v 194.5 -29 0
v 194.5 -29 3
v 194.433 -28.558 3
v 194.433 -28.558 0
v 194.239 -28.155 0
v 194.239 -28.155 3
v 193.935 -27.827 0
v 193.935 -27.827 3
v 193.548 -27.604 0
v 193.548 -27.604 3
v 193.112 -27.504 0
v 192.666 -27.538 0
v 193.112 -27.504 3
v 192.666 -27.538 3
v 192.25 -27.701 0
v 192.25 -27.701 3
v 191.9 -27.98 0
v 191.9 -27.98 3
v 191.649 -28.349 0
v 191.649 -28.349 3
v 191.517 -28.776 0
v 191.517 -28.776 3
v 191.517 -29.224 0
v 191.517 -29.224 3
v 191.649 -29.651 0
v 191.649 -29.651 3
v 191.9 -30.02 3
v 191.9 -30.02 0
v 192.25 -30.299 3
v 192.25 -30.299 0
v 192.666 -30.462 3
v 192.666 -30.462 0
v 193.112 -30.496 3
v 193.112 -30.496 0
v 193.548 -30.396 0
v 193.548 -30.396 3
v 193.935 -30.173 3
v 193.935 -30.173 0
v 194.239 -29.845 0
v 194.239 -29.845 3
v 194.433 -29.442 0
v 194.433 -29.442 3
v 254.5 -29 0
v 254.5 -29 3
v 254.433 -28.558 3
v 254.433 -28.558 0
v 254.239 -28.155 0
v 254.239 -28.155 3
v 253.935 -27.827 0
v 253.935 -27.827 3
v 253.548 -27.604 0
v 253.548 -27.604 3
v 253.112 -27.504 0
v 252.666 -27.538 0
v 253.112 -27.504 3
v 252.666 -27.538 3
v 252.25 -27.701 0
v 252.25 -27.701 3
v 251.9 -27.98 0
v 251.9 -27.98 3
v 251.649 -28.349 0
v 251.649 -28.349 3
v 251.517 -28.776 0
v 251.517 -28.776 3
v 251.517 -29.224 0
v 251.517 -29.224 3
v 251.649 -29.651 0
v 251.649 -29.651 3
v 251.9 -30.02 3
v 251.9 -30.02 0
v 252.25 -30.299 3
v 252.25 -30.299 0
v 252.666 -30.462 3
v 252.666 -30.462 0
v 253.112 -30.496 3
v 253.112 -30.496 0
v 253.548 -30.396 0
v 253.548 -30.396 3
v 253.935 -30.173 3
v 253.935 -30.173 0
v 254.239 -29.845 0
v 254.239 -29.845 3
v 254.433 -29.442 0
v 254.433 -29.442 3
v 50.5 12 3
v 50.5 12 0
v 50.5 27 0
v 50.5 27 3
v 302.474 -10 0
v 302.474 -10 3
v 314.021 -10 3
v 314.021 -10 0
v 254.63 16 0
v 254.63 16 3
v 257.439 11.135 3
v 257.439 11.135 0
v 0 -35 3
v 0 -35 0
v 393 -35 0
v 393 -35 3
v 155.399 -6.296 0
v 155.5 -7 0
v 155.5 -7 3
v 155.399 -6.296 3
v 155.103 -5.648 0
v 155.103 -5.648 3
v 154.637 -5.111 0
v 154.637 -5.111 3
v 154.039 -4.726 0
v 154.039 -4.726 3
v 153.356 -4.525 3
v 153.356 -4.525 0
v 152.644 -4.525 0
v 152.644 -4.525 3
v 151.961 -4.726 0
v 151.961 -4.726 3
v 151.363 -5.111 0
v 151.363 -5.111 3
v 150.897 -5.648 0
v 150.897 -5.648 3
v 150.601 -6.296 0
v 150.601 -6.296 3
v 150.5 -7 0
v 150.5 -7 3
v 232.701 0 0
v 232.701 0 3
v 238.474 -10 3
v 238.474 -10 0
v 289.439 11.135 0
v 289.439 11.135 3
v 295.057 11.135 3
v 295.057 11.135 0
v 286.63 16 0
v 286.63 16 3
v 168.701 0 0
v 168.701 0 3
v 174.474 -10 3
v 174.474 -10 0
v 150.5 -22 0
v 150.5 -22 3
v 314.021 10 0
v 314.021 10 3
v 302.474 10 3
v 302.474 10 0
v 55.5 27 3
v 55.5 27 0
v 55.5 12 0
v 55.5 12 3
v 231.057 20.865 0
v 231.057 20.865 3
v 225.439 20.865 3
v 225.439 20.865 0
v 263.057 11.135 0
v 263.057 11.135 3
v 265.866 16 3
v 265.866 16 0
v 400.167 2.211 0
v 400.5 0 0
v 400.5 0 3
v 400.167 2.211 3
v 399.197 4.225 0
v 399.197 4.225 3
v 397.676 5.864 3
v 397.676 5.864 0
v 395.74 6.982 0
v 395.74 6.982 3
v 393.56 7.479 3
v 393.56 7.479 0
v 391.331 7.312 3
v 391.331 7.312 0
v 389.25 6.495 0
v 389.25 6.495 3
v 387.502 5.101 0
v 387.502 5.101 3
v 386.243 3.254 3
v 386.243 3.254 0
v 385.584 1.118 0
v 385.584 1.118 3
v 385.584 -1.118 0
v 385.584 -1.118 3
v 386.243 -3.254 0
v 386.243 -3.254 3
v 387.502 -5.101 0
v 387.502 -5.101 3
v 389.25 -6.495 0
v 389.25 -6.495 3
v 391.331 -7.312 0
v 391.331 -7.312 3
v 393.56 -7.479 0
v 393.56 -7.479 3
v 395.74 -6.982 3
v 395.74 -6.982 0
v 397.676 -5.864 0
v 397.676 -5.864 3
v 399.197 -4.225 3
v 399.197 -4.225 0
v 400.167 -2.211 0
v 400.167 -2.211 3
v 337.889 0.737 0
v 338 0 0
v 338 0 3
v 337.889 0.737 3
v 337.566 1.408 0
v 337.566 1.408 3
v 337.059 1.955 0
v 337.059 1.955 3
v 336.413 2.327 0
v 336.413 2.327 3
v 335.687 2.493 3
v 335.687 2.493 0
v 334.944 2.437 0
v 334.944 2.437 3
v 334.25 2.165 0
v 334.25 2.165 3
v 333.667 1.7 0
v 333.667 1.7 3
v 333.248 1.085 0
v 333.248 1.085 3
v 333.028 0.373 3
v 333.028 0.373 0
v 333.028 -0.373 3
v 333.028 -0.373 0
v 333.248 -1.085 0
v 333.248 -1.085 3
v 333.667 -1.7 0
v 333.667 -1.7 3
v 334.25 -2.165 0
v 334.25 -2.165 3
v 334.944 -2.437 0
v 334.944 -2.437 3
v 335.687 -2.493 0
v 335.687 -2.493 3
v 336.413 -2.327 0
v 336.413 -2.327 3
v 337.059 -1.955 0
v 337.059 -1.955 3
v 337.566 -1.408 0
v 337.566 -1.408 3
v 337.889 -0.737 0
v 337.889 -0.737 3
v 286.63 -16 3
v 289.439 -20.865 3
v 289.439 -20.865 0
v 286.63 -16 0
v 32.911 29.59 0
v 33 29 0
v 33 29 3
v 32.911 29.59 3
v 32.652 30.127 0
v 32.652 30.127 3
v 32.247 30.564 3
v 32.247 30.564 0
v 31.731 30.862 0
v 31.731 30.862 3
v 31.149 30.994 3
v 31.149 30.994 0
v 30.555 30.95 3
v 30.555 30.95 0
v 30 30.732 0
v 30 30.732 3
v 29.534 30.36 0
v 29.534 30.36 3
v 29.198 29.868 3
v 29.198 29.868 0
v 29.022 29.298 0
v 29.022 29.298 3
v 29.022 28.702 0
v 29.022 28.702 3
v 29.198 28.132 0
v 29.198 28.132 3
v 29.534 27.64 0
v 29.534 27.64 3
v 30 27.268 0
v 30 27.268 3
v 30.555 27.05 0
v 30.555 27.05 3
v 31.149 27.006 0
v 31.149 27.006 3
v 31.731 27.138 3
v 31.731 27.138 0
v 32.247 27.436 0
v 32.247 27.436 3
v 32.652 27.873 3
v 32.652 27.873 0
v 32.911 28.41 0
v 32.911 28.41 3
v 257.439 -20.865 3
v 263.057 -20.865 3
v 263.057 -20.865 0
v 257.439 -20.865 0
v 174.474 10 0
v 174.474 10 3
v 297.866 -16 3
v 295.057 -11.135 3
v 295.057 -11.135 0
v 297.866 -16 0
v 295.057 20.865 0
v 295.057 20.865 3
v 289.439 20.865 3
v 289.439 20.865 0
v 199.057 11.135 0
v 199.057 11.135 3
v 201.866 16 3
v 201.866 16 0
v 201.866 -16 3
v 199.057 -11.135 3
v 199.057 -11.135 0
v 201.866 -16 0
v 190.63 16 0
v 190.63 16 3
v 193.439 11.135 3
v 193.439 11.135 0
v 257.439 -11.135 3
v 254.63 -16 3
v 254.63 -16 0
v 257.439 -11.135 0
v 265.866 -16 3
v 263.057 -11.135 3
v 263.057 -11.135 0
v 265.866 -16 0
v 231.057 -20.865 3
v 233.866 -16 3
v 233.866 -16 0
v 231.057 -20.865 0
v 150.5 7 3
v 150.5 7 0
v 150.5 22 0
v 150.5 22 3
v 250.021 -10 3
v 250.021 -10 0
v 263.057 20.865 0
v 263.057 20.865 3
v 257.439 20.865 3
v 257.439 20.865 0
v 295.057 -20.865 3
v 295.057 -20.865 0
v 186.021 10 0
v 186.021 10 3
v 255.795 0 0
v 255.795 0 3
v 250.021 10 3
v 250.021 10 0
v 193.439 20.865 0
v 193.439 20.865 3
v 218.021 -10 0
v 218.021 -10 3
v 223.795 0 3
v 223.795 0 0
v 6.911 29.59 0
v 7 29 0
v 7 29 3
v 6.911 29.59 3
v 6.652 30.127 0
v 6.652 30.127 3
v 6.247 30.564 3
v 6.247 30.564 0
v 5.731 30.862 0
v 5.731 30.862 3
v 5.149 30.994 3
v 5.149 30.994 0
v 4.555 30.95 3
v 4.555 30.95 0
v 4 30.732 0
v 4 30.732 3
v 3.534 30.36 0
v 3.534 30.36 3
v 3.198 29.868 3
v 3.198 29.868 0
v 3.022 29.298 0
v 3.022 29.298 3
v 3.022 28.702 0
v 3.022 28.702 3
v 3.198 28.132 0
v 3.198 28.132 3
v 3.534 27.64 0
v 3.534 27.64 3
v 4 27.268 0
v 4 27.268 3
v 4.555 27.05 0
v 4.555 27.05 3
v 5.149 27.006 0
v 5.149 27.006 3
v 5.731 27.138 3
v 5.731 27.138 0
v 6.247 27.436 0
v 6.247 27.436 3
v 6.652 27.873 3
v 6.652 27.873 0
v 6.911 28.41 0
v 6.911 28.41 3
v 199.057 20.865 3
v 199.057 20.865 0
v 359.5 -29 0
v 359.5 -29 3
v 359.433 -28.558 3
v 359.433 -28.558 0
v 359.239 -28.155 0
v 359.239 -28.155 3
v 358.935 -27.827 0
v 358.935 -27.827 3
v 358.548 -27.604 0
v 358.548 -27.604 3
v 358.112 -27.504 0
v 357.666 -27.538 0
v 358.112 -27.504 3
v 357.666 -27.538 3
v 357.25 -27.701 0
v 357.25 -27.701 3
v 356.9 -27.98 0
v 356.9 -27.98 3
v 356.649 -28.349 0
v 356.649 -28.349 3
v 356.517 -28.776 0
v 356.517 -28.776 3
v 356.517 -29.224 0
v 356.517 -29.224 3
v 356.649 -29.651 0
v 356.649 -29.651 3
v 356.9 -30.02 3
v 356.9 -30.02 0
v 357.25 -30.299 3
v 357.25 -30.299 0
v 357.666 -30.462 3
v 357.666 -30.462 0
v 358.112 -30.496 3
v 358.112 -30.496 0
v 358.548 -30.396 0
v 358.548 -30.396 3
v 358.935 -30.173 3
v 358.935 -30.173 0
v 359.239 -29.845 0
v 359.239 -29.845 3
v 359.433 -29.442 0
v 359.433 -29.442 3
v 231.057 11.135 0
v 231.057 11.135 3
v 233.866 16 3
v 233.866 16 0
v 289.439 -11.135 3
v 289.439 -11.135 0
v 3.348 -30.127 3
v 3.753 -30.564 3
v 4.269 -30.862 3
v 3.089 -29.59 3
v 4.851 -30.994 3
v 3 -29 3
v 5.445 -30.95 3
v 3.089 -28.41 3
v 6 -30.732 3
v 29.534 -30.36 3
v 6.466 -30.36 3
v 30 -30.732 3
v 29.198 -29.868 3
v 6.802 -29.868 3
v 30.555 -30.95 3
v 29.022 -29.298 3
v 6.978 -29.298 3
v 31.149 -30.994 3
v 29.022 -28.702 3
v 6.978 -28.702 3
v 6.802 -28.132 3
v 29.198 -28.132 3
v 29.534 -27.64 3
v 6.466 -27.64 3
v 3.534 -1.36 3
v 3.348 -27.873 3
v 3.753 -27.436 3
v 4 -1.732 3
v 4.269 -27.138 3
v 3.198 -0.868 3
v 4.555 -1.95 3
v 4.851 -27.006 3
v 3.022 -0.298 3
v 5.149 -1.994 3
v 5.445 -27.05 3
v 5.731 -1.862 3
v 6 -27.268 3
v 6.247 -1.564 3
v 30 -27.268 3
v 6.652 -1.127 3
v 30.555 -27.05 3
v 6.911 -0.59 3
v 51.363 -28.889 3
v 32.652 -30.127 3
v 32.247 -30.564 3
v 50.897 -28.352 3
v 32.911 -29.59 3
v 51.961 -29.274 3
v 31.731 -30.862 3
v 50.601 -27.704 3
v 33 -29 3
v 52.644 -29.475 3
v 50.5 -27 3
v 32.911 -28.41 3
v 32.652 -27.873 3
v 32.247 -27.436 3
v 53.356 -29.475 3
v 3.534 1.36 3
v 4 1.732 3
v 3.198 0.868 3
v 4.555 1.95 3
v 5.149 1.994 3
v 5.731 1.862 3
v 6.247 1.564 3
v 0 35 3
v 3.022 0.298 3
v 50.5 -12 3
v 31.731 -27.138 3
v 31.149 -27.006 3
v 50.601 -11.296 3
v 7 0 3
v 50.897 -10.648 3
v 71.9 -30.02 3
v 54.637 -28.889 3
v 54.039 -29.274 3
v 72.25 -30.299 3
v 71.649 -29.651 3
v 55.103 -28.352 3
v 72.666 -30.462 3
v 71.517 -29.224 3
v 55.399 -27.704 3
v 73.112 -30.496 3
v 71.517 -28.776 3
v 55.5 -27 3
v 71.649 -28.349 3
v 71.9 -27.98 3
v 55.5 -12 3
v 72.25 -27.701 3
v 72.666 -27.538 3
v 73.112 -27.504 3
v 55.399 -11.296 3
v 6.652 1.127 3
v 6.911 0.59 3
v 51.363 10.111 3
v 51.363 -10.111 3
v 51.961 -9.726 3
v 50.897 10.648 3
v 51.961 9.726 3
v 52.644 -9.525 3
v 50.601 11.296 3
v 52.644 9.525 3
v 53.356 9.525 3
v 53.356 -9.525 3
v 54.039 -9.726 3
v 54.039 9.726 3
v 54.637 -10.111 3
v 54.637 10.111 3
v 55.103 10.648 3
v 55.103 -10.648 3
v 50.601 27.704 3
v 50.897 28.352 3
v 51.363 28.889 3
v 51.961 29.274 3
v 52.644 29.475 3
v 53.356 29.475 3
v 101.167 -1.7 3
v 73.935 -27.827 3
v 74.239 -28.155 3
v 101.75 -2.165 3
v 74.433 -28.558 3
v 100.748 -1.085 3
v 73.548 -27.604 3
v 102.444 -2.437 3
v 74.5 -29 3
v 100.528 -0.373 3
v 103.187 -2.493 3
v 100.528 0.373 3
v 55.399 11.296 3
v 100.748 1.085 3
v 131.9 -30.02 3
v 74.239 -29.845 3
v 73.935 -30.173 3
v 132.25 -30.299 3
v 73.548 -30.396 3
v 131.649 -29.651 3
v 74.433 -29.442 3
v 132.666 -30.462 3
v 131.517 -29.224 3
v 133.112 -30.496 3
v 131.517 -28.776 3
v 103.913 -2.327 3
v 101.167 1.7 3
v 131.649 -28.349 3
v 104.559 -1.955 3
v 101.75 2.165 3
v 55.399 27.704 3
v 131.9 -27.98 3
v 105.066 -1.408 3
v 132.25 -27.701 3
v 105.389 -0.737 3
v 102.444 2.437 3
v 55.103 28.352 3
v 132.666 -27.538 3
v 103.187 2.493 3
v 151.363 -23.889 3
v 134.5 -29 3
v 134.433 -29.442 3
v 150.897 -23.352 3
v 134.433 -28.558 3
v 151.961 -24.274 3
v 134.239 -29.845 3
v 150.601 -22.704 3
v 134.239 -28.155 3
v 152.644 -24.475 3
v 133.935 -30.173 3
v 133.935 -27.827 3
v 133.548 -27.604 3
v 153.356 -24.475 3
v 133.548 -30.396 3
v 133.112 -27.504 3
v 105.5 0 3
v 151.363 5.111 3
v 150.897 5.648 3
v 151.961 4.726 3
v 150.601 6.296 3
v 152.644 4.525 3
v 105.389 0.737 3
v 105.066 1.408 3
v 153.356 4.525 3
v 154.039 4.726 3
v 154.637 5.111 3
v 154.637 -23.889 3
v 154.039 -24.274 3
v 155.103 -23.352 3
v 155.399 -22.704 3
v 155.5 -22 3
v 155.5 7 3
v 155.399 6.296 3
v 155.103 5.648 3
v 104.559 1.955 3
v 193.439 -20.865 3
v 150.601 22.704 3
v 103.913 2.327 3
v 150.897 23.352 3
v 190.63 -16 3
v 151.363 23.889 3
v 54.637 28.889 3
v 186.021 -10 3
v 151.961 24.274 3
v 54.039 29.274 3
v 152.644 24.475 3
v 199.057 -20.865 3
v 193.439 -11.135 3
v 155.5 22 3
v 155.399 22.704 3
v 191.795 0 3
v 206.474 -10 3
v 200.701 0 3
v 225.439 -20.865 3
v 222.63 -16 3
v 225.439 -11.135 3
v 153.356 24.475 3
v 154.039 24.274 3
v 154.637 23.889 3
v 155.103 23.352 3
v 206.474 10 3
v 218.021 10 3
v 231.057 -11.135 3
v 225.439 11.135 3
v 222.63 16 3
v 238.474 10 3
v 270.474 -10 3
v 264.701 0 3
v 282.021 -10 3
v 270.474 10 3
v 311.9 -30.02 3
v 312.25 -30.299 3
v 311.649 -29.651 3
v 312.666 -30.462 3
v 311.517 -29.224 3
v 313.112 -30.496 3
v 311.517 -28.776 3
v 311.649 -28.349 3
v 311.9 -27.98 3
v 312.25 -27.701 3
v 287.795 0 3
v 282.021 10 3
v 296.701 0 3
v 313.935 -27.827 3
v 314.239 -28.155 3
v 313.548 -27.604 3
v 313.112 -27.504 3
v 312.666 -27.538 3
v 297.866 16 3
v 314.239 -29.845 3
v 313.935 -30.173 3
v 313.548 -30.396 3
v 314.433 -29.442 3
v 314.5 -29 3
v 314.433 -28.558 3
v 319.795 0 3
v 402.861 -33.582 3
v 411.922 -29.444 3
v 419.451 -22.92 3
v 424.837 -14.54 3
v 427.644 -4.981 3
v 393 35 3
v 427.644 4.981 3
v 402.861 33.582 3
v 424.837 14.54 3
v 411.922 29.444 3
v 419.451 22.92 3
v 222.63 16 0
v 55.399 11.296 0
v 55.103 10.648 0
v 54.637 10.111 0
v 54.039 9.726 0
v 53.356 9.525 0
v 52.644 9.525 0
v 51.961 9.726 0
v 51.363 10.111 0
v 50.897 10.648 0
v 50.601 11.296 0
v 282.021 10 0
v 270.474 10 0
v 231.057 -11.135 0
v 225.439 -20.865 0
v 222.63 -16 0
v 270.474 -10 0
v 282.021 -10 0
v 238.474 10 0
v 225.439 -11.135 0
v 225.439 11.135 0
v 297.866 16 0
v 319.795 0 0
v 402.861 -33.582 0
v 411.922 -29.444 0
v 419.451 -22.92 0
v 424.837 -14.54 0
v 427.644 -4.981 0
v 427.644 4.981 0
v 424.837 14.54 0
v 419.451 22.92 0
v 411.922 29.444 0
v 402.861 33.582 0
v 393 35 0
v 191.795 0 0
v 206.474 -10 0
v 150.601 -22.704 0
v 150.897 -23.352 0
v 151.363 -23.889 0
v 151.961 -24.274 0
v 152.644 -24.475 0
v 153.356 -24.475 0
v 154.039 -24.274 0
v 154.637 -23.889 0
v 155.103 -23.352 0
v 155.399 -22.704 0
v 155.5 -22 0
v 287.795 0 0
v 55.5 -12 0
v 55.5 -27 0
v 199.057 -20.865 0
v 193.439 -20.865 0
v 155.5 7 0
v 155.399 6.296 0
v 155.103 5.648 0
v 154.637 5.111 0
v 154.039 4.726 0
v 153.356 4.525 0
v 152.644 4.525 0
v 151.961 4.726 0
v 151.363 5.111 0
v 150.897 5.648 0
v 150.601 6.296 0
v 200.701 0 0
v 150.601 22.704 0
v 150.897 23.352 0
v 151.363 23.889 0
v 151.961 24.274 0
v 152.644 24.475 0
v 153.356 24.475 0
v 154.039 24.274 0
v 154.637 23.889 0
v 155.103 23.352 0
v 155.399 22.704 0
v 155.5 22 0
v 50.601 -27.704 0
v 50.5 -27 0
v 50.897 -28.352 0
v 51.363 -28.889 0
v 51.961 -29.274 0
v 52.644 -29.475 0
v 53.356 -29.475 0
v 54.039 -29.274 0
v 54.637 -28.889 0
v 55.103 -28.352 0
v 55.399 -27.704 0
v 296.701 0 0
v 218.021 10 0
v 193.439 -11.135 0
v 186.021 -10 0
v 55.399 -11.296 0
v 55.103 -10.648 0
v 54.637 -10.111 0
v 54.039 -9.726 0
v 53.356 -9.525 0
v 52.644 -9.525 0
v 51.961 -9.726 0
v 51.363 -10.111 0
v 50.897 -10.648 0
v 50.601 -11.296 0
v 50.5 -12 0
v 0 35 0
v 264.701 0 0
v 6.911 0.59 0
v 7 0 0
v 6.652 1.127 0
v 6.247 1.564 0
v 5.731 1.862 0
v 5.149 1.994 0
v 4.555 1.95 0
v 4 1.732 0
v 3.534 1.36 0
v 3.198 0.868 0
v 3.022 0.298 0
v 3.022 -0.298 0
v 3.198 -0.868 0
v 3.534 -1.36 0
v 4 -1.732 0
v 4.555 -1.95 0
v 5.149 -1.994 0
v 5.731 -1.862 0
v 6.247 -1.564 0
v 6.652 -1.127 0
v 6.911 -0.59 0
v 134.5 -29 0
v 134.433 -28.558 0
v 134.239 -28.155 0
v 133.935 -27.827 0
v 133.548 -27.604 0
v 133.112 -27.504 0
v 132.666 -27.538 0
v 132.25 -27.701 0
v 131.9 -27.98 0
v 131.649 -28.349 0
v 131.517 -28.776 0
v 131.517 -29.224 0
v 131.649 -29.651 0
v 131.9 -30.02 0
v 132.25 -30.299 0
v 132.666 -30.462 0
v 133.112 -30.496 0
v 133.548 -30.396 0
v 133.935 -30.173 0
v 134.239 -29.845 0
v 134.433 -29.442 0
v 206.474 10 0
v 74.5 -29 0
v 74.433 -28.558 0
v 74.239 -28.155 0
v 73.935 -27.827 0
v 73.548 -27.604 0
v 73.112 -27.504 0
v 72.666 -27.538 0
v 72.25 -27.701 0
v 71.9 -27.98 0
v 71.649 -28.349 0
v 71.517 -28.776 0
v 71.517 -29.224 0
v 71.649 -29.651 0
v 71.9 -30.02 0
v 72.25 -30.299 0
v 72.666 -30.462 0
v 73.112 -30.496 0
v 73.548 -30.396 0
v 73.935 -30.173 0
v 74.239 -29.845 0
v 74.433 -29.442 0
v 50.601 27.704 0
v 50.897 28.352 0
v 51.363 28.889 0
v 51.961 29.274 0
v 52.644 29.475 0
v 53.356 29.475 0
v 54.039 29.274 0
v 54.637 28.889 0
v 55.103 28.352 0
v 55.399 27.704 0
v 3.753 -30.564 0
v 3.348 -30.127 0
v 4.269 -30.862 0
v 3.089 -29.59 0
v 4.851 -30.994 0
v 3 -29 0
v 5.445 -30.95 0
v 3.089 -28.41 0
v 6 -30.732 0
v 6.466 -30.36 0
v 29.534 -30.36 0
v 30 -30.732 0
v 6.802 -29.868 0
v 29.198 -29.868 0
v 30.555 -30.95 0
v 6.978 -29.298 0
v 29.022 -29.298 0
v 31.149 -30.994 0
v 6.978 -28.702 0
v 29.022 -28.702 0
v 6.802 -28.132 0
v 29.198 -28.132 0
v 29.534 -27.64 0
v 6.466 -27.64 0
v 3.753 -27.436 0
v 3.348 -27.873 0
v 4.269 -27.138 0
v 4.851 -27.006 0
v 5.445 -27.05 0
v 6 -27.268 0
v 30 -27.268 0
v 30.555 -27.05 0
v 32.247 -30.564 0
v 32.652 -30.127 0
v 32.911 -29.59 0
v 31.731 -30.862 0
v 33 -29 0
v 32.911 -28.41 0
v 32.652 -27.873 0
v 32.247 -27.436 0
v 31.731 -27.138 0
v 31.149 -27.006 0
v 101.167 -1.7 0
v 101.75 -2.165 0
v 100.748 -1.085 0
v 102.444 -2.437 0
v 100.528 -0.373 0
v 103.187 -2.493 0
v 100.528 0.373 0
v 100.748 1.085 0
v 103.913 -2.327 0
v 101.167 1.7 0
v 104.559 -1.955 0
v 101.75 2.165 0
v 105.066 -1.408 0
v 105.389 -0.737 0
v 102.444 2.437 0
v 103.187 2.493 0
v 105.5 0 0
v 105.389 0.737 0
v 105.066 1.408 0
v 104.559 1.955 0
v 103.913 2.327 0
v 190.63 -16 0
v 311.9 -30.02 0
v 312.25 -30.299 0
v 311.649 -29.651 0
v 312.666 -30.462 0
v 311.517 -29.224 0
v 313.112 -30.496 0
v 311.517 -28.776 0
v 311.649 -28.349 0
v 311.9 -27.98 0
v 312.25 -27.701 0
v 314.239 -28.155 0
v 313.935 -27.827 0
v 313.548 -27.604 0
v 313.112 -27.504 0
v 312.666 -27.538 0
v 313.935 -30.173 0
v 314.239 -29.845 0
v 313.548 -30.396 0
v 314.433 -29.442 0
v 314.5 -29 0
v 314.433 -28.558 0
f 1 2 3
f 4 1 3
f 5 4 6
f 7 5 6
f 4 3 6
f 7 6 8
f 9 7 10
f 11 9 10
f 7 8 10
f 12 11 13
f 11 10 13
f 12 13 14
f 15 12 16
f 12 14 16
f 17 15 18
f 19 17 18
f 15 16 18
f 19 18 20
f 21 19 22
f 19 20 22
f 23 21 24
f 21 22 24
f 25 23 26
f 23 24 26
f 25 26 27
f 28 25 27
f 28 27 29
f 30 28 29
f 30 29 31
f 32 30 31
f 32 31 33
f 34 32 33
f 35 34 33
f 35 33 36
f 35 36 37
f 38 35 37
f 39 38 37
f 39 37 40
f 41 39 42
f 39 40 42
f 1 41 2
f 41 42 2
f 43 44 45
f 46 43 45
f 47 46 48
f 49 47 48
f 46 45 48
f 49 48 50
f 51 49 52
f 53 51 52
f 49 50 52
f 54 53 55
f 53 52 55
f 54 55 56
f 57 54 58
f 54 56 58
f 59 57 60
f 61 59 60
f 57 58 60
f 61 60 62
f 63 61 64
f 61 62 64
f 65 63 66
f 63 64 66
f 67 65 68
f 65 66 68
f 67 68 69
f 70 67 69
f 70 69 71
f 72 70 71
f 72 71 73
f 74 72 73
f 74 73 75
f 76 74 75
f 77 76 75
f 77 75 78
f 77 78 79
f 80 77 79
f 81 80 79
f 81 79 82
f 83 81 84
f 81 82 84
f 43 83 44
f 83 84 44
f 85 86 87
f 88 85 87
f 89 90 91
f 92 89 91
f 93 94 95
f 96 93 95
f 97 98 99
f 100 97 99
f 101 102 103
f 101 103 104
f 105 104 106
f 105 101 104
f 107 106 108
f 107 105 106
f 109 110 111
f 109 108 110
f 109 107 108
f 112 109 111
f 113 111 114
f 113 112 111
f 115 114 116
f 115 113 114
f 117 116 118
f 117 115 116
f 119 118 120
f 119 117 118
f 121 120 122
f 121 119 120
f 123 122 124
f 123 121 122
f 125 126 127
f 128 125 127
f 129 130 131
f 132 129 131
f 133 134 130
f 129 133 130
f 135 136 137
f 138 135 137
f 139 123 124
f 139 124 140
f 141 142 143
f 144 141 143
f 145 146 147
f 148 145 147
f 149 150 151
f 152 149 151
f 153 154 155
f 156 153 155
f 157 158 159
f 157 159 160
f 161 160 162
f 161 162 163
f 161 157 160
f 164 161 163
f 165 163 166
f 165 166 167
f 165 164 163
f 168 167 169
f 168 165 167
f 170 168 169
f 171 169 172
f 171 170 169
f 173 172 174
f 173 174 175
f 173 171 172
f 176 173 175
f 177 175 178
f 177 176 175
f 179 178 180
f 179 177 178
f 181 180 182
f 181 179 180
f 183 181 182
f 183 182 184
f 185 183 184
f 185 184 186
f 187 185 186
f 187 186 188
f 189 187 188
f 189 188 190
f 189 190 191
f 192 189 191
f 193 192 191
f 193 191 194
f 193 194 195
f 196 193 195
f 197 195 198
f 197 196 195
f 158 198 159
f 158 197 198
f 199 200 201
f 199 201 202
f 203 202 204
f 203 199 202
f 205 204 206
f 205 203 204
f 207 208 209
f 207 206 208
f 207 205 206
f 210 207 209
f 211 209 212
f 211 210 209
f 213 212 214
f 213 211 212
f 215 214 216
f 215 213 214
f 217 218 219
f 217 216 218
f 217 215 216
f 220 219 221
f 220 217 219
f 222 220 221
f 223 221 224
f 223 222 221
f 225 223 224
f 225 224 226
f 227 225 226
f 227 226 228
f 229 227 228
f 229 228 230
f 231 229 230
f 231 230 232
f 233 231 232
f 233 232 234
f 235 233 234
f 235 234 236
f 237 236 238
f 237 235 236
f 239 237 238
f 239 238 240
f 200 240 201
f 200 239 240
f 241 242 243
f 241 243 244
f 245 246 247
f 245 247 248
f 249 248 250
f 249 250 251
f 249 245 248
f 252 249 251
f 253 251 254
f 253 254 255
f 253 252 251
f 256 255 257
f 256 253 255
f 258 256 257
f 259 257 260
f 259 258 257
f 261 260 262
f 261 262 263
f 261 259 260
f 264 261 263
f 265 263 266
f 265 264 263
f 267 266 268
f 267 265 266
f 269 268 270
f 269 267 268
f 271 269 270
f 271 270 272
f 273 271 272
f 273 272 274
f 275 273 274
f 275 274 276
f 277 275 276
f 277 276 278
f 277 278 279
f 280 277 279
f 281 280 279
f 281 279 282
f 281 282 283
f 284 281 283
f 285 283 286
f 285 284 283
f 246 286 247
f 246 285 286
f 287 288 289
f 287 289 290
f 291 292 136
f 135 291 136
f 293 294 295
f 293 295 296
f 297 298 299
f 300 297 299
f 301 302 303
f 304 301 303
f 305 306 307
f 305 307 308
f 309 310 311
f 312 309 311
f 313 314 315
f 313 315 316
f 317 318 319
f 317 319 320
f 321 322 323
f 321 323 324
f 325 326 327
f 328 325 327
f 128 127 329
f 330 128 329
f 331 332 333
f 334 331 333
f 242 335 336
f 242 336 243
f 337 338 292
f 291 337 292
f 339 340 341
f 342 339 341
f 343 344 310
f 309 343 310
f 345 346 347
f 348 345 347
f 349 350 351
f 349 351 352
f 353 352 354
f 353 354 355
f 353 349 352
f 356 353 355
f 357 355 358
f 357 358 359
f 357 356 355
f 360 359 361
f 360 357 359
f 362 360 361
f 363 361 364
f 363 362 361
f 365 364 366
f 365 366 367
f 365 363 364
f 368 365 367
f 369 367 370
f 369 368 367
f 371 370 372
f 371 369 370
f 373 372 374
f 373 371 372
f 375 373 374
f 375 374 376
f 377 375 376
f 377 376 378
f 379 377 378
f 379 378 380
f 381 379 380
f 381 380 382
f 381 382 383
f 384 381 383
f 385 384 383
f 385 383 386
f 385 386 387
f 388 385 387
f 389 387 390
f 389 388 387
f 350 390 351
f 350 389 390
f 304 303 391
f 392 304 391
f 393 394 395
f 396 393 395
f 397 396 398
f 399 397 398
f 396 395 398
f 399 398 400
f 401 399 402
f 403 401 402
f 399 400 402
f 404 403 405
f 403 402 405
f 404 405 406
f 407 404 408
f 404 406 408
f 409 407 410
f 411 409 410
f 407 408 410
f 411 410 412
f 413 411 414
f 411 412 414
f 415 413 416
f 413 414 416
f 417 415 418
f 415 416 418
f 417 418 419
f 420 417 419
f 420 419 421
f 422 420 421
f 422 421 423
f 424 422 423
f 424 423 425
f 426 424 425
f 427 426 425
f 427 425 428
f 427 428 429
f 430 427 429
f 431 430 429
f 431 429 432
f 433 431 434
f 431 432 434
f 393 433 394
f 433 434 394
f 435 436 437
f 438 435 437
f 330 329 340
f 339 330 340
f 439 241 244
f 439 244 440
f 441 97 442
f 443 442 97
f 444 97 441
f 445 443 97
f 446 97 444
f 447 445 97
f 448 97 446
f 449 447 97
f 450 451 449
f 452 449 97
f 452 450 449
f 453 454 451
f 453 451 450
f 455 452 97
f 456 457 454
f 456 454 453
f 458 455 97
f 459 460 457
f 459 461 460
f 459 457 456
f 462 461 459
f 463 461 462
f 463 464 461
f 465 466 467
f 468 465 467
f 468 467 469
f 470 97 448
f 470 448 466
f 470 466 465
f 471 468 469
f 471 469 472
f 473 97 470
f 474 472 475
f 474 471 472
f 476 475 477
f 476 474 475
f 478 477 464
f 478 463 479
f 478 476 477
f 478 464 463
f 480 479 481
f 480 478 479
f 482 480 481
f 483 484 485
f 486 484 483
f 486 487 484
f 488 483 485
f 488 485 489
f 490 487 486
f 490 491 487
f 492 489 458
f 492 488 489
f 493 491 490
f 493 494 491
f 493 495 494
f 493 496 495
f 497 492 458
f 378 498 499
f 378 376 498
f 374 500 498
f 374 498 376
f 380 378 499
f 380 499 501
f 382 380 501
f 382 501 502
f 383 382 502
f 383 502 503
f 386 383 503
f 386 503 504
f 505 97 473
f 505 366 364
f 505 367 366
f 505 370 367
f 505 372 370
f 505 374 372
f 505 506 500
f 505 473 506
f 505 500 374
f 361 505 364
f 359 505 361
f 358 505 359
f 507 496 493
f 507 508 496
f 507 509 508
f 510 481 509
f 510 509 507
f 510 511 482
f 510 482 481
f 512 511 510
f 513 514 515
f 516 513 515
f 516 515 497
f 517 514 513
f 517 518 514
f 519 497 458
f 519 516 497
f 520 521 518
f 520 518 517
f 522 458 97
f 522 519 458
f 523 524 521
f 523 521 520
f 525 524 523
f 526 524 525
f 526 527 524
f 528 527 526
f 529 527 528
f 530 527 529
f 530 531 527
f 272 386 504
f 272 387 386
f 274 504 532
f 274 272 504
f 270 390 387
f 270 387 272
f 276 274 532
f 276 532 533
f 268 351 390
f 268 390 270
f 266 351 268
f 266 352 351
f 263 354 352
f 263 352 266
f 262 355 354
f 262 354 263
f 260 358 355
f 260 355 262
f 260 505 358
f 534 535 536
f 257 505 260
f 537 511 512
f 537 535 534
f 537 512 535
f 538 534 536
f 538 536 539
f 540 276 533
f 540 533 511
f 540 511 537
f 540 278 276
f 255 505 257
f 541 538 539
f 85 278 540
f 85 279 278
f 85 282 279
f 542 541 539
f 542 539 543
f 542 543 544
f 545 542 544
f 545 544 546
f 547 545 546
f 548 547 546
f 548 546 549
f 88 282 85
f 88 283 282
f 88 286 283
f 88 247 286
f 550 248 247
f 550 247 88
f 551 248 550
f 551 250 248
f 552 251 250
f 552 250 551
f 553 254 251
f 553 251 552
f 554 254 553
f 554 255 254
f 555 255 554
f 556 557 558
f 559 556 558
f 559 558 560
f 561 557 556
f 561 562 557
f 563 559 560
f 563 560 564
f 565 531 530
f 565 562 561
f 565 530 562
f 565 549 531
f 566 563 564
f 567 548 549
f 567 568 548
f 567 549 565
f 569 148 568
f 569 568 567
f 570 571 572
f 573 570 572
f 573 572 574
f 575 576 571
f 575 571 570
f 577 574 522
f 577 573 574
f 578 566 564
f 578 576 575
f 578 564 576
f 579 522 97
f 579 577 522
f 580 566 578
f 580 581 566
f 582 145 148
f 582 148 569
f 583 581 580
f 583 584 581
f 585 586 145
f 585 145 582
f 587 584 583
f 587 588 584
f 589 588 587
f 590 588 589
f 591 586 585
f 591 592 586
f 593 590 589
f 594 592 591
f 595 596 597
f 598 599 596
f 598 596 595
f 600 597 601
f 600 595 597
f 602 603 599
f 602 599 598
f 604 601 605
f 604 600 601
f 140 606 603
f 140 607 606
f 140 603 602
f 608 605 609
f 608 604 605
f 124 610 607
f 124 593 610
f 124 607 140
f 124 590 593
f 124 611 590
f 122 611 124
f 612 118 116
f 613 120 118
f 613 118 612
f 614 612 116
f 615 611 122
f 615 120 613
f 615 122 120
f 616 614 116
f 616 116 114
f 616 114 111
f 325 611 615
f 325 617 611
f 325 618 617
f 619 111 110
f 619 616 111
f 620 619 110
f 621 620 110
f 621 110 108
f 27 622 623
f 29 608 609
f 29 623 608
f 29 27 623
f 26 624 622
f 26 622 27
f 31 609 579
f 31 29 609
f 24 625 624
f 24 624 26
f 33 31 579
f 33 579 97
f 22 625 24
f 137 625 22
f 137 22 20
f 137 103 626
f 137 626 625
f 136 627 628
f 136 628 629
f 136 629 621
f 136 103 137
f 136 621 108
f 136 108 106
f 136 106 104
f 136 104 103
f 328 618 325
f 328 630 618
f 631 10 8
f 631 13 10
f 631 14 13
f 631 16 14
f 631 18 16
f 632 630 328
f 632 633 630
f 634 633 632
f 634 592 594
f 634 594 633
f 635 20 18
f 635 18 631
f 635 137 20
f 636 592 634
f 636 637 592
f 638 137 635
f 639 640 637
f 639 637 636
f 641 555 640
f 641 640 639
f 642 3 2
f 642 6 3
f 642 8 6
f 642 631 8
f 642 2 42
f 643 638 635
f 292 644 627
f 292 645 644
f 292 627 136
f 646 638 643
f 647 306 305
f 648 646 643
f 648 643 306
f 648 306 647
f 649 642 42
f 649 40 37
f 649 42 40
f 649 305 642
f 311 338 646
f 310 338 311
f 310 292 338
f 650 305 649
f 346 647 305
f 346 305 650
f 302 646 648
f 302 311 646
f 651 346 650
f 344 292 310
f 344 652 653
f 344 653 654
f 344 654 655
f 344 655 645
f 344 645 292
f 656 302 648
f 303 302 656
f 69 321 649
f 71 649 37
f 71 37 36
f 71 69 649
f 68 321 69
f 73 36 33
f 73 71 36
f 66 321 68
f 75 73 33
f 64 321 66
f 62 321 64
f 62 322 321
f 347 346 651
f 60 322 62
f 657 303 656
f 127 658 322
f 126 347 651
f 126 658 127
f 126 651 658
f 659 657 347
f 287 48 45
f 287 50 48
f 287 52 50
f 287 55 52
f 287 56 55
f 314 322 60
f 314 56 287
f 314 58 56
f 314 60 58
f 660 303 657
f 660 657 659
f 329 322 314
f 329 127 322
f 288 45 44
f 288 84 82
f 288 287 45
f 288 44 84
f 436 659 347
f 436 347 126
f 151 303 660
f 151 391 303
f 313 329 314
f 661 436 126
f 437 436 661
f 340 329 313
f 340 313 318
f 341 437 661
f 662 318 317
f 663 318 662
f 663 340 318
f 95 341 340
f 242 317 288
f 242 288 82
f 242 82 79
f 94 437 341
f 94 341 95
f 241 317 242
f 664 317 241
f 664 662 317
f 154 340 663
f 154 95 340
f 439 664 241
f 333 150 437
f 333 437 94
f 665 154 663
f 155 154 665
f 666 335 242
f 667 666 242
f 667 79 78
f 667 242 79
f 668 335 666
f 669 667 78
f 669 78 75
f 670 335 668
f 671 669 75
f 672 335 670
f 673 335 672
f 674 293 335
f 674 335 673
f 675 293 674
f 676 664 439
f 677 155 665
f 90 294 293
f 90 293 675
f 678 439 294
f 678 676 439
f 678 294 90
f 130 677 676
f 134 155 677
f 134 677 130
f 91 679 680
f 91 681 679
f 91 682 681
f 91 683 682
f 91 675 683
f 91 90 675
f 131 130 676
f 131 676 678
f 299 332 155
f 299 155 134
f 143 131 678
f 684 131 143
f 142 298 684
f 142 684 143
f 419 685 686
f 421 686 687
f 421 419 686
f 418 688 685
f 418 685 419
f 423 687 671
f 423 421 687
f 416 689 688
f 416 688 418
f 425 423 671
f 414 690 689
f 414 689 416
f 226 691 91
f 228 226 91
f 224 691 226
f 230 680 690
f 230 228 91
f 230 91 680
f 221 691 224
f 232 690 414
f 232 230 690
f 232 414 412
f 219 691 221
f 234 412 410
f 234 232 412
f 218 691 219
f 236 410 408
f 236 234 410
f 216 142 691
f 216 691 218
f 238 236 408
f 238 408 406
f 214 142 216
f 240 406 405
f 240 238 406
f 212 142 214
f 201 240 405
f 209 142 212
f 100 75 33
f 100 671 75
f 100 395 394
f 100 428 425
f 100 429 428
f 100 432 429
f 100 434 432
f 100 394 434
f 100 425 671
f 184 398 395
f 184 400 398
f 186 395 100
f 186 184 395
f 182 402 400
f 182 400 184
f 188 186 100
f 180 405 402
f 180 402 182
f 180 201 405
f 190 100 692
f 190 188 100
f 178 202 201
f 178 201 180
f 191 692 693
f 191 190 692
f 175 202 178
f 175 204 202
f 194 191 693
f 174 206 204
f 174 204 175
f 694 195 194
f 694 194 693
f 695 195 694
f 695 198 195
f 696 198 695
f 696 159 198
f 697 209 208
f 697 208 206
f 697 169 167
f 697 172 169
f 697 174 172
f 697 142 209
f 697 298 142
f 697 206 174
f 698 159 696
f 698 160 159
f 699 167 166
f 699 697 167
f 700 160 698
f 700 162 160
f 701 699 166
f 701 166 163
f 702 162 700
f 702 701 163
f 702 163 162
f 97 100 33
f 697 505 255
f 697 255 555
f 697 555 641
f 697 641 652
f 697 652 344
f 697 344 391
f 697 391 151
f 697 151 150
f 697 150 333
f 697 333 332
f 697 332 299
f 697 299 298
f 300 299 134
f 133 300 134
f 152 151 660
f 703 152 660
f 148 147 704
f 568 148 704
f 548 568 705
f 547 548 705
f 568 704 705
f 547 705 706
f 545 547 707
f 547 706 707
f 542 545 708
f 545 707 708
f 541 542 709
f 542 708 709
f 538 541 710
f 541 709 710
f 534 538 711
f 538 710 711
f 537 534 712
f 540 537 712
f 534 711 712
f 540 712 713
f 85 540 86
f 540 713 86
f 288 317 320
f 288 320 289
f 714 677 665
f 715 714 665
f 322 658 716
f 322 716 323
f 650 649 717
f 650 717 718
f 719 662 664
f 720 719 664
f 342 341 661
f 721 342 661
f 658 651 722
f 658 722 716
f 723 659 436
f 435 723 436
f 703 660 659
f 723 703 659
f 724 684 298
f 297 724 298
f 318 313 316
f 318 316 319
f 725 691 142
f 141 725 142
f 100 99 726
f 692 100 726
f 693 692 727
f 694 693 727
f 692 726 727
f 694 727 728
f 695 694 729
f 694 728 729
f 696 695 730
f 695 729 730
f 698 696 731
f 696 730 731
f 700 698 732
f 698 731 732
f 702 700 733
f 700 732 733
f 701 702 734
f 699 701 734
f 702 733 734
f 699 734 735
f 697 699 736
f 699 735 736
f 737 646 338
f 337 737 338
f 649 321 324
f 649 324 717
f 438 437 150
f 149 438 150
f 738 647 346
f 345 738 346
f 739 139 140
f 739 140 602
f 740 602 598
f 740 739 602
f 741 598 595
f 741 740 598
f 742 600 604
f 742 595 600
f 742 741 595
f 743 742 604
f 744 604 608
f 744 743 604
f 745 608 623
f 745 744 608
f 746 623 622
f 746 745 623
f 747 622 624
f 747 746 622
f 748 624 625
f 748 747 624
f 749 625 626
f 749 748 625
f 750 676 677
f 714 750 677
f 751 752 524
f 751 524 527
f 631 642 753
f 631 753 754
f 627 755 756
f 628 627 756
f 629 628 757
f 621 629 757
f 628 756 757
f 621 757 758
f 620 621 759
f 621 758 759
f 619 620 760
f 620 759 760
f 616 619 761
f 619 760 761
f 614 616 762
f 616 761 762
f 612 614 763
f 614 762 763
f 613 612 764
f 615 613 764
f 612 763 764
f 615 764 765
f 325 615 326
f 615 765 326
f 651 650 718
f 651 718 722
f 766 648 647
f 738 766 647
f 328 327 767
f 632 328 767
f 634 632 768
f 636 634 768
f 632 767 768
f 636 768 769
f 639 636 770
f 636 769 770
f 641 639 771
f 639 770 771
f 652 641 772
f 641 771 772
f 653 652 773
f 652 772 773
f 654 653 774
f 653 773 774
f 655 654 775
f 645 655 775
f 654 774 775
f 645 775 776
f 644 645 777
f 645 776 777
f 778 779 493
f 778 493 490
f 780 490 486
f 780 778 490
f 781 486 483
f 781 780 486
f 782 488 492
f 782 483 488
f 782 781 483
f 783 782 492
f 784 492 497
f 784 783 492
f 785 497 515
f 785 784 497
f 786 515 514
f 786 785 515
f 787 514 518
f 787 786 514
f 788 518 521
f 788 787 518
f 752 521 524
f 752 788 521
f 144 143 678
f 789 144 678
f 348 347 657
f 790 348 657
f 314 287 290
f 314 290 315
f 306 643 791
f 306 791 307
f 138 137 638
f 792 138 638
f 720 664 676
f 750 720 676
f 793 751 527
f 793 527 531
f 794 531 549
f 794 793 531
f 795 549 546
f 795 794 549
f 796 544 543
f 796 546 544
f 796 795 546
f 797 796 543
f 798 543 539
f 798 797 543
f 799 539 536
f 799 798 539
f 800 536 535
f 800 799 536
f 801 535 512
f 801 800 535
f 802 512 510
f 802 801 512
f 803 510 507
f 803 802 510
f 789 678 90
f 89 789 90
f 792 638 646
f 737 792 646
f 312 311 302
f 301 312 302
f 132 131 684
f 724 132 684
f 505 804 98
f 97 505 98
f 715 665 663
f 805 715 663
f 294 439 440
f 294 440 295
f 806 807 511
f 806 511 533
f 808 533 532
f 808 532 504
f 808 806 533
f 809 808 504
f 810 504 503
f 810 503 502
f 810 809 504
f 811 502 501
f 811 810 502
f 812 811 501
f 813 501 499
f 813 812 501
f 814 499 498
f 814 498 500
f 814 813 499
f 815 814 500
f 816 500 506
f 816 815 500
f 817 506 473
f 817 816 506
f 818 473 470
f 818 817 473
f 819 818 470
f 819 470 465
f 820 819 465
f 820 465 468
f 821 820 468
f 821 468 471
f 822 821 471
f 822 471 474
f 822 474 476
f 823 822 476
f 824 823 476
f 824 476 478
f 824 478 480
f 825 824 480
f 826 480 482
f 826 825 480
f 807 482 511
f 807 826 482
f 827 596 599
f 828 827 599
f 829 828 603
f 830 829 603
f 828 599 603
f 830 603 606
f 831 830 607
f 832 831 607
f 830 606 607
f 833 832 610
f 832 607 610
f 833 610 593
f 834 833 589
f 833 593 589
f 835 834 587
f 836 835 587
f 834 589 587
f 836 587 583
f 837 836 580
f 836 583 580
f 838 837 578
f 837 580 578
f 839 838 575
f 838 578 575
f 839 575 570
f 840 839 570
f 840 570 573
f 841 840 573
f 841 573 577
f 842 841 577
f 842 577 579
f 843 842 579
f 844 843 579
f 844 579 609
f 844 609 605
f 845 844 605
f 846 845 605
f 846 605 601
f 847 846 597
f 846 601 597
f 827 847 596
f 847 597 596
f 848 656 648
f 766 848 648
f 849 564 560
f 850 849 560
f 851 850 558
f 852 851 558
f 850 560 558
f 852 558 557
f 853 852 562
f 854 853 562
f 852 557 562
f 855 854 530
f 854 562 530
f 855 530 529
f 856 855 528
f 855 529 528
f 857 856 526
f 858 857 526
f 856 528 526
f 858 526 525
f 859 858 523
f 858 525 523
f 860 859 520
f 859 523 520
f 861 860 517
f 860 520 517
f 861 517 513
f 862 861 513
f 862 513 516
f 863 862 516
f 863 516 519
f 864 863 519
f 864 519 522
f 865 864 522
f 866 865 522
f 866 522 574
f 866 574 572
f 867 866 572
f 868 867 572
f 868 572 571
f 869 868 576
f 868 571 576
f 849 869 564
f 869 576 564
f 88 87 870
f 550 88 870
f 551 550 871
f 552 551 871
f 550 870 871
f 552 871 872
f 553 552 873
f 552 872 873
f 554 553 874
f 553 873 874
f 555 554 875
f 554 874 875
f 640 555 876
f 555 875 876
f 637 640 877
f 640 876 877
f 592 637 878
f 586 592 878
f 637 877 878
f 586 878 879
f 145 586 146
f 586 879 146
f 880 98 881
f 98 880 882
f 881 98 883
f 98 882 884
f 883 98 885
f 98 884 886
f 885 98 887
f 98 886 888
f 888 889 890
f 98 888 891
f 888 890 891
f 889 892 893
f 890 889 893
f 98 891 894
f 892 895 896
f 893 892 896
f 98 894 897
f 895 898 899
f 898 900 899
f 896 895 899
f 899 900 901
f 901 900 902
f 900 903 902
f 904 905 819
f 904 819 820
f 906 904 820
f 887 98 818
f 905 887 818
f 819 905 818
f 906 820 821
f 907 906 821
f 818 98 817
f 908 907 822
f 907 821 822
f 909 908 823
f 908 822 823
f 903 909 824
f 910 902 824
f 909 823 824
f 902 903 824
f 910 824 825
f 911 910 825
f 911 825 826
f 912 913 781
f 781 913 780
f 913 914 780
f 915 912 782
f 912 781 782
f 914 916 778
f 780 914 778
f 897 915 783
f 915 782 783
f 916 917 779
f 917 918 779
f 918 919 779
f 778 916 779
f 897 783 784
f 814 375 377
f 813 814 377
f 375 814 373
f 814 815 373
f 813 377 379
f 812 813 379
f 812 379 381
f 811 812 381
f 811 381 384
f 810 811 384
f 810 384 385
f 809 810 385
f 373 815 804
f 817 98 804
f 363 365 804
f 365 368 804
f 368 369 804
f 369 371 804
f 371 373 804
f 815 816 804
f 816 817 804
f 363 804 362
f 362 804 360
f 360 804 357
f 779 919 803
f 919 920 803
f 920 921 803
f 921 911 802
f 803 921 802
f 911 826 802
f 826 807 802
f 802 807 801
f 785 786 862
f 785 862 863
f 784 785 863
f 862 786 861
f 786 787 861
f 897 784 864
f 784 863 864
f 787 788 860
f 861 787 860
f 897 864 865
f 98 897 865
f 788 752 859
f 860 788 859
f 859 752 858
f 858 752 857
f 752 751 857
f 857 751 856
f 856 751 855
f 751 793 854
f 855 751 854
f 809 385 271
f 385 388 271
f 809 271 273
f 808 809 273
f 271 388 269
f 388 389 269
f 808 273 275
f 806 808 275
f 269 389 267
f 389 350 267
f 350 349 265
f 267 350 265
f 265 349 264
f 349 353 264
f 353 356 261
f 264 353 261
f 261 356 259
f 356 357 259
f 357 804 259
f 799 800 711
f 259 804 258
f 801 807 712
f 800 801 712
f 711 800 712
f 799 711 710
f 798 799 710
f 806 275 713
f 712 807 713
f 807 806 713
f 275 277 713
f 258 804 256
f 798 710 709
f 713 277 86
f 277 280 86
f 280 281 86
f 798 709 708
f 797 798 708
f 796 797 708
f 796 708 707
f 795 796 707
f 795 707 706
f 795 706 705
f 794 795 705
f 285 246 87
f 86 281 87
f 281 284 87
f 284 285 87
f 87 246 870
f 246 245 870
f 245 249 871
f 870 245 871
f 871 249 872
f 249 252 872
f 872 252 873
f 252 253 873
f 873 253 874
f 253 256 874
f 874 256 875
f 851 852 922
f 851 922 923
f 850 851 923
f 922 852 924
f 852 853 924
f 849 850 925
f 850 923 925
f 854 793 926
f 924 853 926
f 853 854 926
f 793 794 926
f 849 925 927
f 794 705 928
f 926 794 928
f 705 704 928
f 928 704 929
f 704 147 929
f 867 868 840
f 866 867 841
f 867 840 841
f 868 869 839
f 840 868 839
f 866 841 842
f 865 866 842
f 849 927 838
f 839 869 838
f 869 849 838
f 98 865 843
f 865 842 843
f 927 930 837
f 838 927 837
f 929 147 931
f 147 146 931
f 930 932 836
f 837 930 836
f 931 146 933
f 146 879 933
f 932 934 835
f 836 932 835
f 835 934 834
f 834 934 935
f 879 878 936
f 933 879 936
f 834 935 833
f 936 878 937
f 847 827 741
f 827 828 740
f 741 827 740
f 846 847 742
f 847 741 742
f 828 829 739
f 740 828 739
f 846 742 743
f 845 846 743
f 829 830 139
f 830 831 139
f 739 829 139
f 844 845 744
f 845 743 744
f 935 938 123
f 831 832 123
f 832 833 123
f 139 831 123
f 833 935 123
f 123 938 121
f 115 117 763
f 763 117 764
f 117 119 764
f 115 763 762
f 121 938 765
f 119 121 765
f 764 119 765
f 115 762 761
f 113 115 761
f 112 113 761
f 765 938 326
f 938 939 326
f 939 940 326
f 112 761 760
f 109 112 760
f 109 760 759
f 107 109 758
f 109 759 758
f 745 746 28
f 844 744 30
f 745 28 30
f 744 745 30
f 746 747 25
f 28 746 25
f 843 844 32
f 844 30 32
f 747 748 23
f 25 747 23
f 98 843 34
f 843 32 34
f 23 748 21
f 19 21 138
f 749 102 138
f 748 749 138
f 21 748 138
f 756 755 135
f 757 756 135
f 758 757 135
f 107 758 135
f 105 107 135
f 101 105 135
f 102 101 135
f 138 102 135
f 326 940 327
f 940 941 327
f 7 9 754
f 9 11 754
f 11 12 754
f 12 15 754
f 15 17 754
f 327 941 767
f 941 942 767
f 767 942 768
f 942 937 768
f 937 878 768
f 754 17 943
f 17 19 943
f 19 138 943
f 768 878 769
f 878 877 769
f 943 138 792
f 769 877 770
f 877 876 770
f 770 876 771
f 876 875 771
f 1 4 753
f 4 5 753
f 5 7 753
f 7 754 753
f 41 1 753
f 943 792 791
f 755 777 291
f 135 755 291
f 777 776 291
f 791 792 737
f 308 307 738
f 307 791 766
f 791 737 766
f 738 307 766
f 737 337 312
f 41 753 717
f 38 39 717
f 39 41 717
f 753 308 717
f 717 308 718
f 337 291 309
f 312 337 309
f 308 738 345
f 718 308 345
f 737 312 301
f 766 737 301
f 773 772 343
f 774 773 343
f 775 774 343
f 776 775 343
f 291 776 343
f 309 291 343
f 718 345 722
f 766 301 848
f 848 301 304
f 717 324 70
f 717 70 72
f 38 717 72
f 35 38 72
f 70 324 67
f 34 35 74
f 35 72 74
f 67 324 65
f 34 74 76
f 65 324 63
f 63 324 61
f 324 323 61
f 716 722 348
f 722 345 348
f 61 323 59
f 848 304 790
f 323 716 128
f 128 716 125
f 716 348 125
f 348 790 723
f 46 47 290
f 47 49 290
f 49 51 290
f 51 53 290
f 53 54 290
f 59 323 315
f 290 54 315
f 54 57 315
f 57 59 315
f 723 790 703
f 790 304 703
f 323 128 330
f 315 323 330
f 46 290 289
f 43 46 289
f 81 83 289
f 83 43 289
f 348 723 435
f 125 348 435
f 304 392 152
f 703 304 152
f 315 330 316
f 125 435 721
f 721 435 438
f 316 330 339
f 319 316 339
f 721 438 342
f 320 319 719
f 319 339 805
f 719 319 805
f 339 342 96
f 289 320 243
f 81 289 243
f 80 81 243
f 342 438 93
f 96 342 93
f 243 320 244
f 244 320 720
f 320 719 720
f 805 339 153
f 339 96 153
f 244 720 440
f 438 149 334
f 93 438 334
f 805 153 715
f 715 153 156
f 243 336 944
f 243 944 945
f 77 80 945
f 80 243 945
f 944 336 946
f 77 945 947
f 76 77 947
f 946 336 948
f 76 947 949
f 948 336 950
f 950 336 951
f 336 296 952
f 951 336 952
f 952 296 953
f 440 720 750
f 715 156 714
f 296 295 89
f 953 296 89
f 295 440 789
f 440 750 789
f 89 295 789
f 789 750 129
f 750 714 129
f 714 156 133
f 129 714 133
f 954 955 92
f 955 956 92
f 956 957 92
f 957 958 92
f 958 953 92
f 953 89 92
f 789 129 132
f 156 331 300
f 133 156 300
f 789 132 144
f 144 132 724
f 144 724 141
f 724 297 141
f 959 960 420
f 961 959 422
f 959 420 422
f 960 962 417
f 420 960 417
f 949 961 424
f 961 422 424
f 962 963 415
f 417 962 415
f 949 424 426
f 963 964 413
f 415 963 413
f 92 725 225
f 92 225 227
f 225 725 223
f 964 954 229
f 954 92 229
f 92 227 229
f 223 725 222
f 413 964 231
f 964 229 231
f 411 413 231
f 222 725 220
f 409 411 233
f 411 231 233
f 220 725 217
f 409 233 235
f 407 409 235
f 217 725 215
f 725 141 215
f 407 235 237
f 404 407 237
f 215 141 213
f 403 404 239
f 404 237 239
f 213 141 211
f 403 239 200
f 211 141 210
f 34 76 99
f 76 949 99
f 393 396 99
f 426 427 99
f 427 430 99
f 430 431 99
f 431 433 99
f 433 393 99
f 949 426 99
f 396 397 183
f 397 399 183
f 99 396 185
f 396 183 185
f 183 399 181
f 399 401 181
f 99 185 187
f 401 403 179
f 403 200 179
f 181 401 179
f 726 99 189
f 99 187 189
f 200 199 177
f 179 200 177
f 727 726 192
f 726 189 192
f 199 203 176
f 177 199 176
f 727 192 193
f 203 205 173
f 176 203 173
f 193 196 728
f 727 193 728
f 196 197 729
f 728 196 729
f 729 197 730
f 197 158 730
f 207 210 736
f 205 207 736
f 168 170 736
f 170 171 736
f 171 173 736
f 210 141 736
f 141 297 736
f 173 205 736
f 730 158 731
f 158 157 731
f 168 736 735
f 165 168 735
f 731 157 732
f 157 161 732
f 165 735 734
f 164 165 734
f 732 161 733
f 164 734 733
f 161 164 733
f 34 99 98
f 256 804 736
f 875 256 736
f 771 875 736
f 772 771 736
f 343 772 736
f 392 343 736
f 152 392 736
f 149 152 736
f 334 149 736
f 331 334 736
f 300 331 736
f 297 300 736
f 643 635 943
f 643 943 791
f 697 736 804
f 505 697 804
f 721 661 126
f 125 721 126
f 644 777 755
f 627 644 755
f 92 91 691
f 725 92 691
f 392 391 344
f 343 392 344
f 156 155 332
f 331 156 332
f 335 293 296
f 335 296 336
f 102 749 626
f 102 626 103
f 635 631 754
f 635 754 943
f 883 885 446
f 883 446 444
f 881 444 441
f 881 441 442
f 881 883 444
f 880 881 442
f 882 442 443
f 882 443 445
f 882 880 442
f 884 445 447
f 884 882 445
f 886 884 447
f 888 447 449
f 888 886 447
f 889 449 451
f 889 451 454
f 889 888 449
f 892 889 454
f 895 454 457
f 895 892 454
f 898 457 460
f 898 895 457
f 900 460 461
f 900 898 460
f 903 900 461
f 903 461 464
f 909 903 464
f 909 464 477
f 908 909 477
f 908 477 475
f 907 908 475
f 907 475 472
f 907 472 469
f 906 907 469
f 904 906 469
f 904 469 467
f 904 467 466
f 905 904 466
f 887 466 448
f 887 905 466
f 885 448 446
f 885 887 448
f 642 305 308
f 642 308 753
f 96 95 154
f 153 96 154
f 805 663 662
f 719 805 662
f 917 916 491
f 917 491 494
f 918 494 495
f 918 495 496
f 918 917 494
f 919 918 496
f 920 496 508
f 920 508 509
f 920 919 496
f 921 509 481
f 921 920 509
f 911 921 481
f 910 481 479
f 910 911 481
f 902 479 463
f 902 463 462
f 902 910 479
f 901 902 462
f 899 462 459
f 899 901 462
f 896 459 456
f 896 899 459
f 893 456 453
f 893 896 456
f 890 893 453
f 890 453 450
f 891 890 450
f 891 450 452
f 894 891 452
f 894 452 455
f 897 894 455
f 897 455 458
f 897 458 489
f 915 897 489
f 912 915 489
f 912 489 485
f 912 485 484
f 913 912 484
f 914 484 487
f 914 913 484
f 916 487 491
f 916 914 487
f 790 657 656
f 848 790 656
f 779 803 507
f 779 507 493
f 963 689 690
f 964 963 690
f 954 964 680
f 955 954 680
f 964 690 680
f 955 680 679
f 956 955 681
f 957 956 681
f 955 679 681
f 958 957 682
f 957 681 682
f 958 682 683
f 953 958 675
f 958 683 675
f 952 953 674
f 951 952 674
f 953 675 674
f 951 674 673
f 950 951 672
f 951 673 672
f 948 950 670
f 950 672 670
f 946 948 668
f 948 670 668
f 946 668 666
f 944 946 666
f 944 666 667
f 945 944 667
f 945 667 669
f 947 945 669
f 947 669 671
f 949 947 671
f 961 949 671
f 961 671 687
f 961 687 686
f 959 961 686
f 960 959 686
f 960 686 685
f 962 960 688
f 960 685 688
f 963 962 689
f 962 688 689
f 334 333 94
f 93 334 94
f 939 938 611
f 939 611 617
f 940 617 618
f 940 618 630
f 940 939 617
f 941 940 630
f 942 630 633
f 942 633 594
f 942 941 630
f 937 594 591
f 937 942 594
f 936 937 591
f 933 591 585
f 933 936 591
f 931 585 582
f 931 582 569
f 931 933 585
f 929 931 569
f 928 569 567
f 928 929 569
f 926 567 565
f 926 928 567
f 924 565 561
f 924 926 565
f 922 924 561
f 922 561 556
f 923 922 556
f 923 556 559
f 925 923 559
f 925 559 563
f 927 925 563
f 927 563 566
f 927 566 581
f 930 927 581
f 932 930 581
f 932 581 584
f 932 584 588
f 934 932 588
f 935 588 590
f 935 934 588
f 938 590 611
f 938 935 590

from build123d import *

# Parameters (mm, degrees)
SKETCH1_R               = 2
SKETCH1_R_2             = 7.5
SKETCH1_R_3             = 2.5
BOSS_EXTRUDE1_DEPTH     = 3
CUT_EXTRUDE1_DEPTH      = 430.43916915
CUT_EXTRUDE1_DEPTH_BACK = 430.43916915
CUT_EXTRUDE2_DEPTH      = 430.43916915
CUT_EXTRUDE2_DEPTH_BACK = 430.43916915
SKETCH5_R               = 2.5
SKETCH7_R               = 1.5
CUT_EXTRUDE4_DEPTH      = 3
CUT_EXTRUDE6_DEPTH      = 10


with BuildPart() as part:
    # Sketch1 → Boss-Extrude1 (new body)
    with BuildSketch(Plane.XY):
        with BuildLine():
            Line((0, 35), (0, -35))
            Line((0, -35), (393, -35))
            ThreePointArc((393, -35), (428, 0), (393, 35))
            Line((393, 35), (0, 35))
        make_face()
        with Locations((5, 29)):
            Circle(SKETCH1_R, mode=Mode.SUBTRACT)
        with Locations(Location((5, -29, 0), (0, 0, 180))):
            Circle(SKETCH1_R, mode=Mode.SUBTRACT)
        with Locations((393, 0)):
            Circle(SKETCH1_R_2, mode=Mode.SUBTRACT)
        with Locations((103, 0)):
            Circle(SKETCH1_R_3, mode=Mode.SUBTRACT)
        with Locations((31, 29)):
            Circle(SKETCH1_R, mode=Mode.SUBTRACT)
        with Locations((31, -29)):
            Circle(SKETCH1_R, mode=Mode.SUBTRACT)
        with Locations((5, 0)):
            Circle(SKETCH1_R, mode=Mode.SUBTRACT)
    extrude(amount=BOSS_EXTRUDE1_DEPTH)

    # Sketch4 → Cut-Extrude1 (cut, two sides: drawn at the far end of the back side and taken through both)
    with BuildSketch(Plane.XY.offset(3).offset(-CUT_EXTRUDE1_DEPTH_BACK)):
        with BuildLine():
            Line((55.5, 27), (55.5, 12))
            ThreePointArc((55.5, 12), (53, 9.5), (50.5, 12))
            Line((50.5, 12), (50.5, 27))
            ThreePointArc((50.5, 27), (53, 29.5), (55.5, 27))
        make_face()
        with BuildLine():
            Line((155.5, 22), (155.5, 7))
            ThreePointArc((155.5, 7), (153, 4.5), (150.5, 7))
            Line((150.5, 7), (150.5, 22))
            ThreePointArc((150.5, 22), (153, 24.5), (155.5, 22))
        make_face()
        with BuildLine():
            Line((155.5, -22), (155.5, -7))
            ThreePointArc((155.5, -7), (153, -4.5), (150.5, -7))
            Line((150.5, -7), (150.5, -22))
            ThreePointArc((150.5, -22), (153, -24.5), (155.5, -22))
        make_face()
        with BuildLine():
            Line((55.5, -27), (55.5, -12))
            ThreePointArc((55.5, -12), (53, -9.5), (50.5, -12))
            Line((50.5, -12), (50.5, -27))
            ThreePointArc((50.5, -27), (53, -29.5), (55.5, -27))
        make_face()
    extrude(amount=CUT_EXTRUDE1_DEPTH + CUT_EXTRUDE1_DEPTH_BACK, mode=Mode.SUBTRACT)

    # Sketch5 → Cut-Extrude2 (cut, two sides: drawn at the far end of the back side and taken through both)
    with BuildSketch(Plane.XY.offset(3).offset(-CUT_EXTRUDE2_DEPTH_BACK)):
        with Locations((335.5, 0)):
            Circle(SKETCH5_R)
    extrude(amount=CUT_EXTRUDE2_DEPTH + CUT_EXTRUDE2_DEPTH_BACK, mode=Mode.SUBTRACT)

    # Sketch7 → Cut-Extrude4 (cut)
    with BuildSketch(Plane.XY.offset(3)):
        with Locations((73, -29)):
            Circle(SKETCH7_R)
        with Locations((133, -29)):
            Circle(SKETCH7_R)
        with Locations((193, -29)):
            Circle(SKETCH7_R)
        with Locations((253, -29)):
            Circle(SKETCH7_R)
        with Locations((313, -29)):
            Circle(SKETCH7_R)
        with Locations((358, -29)):
            Circle(SKETCH7_R)
    extrude(amount=-CUT_EXTRUDE4_DEPTH, mode=Mode.SUBTRACT)

    # Sketch9 → Cut-Extrude6 (cut)
    with BuildSketch(Plane.XY.offset(3)):
        Polygon((223.795, 0), (218.021497308, 10), (206.474491924, 10), (200.700989232, 0), (206.474491924, -10), (218.021497308, -10), align=None)
        Polygon((191.795, 0), (186.021497308, 10), (174.474491924, 10), (168.700989232, 0), (174.474491924, -10), (186.021497308, -10), align=None)
        Polygon((255.795, 0), (250.021497308, 10), (238.474491924, 10), (232.700989232, 0), (238.474491924, -10), (250.021497308, -10), align=None)
        Polygon((287.795, 0), (282.021497308, 10), (270.474491924, 10), (264.700989232, 0), (270.474491924, -10), (282.021497308, -10), align=None)
        Polygon((233.865777575, 16), (231.056886095, 20.865142755), (225.439103137, 20.865142755), (222.630211658, 16), (225.439103137, 11.134857245), (231.056886095, 11.134857245), align=None)
        Polygon((201.865777575, 16), (199.056886095, 20.865142755), (193.439103137, 20.865142755), (190.630211658, 16), (193.439103137, 11.134857245), (199.056886095, 11.134857245), align=None)
        Polygon((265.865777575, 16), (263.056886095, 20.865142755), (257.439103137, 20.865142755), (254.630211658, 16), (257.439103137, 11.134857245), (263.056886095, 11.134857245), align=None)
        Polygon((319.795, 0), (314.021497308, 10), (302.474491924, 10), (296.700989232, 0), (302.474491924, -10), (314.021497308, -10), align=None)
        Polygon((297.865777575, 16), (295.056886095, 20.865142755), (289.439103137, 20.865142755), (286.630211658, 16), (289.439103137, 11.134857245), (295.056886095, 11.134857245), align=None)
        Polygon((295.056886095, -11.134857245), (297.865777575, -16), (295.056886095, -20.865142755), (289.439103137, -20.865142755), (286.630211658, -16), (289.439103137, -11.134857245), align=None)
        Polygon((263.056886095, -11.134857245), (265.865777575, -16), (263.056886095, -20.865142755), (257.439103137, -20.865142755), (254.630211658, -16), (257.439103137, -11.134857245), align=None)
        Polygon((231.056886095, -11.134857245), (233.865777575, -16), (231.056886095, -20.865142755), (225.439103137, -20.865142755), (222.630211658, -16), (225.439103137, -11.134857245), align=None)
        Polygon((199.056886095, -11.134857245), (201.865777575, -16), (199.056886095, -20.865142755), (193.439103137, -20.865142755), (190.630211658, -16), (193.439103137, -11.134857245), align=None)
    extrude(amount=-CUT_EXTRUDE6_DEPTH, mode=Mode.SUBTRACT)


solid = part.part
